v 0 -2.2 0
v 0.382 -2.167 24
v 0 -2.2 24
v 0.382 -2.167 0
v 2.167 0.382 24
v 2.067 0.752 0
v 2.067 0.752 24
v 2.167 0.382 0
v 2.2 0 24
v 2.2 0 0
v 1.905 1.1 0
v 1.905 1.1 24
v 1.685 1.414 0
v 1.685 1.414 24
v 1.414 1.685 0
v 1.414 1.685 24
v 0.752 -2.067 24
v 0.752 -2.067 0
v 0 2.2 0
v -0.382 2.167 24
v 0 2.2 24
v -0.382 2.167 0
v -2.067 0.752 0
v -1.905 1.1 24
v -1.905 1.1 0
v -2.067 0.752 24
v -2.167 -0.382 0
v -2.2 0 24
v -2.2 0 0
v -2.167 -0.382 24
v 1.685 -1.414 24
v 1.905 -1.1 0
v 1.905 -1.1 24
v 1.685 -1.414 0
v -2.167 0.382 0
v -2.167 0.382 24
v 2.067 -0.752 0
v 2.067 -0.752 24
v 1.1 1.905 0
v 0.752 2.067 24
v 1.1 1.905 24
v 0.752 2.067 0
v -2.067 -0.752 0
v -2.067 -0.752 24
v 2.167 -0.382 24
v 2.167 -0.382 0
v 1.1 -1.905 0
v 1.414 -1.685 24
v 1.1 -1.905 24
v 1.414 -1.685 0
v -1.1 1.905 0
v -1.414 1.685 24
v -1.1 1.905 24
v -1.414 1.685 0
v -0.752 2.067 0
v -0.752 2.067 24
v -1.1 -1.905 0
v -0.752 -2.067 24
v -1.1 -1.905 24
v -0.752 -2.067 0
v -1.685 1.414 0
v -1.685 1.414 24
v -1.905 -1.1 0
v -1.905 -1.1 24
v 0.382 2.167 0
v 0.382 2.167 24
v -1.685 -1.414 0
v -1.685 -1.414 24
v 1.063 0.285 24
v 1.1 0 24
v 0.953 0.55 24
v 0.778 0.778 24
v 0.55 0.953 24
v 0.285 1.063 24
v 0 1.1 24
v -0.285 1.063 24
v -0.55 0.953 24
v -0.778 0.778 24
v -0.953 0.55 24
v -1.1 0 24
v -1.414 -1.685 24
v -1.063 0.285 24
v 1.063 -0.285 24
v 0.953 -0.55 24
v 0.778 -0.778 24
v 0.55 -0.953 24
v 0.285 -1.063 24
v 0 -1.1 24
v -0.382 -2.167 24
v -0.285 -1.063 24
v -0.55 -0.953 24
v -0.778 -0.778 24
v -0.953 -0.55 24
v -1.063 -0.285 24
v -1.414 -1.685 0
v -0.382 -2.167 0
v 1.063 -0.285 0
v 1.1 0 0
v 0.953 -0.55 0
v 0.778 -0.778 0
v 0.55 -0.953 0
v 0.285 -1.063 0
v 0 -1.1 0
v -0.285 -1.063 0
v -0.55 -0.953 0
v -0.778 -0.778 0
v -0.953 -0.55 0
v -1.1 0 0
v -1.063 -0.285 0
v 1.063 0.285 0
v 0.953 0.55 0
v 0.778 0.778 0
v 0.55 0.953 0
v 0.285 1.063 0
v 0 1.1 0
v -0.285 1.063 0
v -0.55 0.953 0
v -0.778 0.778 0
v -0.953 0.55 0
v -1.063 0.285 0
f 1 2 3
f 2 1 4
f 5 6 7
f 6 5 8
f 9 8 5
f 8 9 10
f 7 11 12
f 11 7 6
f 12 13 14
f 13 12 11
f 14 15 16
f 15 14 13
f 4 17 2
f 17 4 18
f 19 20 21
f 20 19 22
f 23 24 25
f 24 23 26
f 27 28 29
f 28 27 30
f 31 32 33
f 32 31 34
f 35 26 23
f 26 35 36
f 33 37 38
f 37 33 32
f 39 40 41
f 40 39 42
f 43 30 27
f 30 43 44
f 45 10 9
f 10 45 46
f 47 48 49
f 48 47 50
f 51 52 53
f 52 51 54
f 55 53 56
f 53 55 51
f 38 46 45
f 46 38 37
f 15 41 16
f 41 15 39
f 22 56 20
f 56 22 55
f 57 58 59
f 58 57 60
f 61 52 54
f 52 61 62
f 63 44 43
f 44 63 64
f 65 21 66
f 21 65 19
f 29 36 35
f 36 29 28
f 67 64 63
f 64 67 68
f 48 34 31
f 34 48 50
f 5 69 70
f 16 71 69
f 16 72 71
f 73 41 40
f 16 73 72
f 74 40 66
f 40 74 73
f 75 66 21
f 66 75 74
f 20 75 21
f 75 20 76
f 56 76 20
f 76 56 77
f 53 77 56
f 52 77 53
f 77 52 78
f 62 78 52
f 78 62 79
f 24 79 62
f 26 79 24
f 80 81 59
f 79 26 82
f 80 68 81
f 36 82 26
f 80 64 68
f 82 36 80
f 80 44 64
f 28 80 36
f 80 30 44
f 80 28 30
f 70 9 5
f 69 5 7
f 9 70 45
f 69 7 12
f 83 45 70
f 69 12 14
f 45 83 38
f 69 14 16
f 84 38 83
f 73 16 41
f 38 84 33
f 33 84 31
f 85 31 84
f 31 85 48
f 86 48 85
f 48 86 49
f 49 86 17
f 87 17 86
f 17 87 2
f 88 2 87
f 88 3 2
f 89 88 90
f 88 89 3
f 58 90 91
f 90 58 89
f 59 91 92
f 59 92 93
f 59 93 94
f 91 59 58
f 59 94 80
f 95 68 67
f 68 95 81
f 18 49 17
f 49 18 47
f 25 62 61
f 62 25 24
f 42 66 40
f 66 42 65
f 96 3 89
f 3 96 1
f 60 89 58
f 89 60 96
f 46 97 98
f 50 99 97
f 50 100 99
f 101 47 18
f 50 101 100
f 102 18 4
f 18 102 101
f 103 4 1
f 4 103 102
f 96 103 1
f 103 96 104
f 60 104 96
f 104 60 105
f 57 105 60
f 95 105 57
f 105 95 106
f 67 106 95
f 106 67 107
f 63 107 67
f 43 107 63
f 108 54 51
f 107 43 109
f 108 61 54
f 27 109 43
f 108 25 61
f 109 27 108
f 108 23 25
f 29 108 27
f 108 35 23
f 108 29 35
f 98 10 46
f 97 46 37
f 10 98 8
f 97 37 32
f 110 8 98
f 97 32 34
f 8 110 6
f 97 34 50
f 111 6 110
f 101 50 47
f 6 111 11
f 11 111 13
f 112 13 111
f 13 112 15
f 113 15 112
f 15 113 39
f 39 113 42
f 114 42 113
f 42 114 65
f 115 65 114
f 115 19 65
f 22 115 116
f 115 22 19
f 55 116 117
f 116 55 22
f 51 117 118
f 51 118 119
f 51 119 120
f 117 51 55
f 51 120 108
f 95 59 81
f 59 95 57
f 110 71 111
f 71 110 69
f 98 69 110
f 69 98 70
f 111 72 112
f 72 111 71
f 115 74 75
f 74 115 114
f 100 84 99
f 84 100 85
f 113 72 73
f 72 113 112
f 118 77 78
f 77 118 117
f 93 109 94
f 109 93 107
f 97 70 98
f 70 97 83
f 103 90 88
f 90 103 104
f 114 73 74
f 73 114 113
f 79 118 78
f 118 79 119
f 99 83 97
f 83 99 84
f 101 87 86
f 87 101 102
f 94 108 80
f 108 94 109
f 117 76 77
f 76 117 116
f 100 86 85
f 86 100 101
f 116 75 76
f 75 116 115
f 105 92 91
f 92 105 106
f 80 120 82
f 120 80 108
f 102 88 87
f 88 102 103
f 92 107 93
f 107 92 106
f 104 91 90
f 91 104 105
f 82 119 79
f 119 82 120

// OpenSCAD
// file: PELA-print-parameters.scad
/*
Parametric PELA Print Tuning Parameters

Published at http://PELAblocks.org

By Paul Houghton
Twitter: @mobile_rat
Email: paulirotta@gmail.com
Blog: https://medium.com/@paulhoughton

Creative Commons Attribution-ShareAlike 4.0 International License
    https://creativecommons.org/licenses/by-sa/4.0/legalcode

Design work kindly sponsored by
    http://futurice.com

Imported automatically into other design files when you include PELA_parameters:
    include <PELA_parameters.scad>
 

INSTRUCTIONS
============
1. Test print PELA_calibration.scad

2. Choose a fit with real PELA

3. Enter those  numbers here. Most commonly you only adjust the top_tweak, bottom_tweak
   and side_connector_tweak numbers to match for your current use case and
   material/printer/slicer settings. Add comment to this file to help remember what you
   have calibrated now and in the past.

4. Print a couple of 4x4 blocks with these adjusted parameters

5. Confirm your calibration fit with real PELA and between two printed blocks.

6. All other models in this set will automatically now be adjusted to use your calibration numbers.


SUGGESTIONS
===========
- Don't waste time- use high precision, injection-moulded PELA parts when they are suitable and available.

- Layer height is not paricularly important, you can use your "standard" setting.

- If needed for a good snap fit, slow down or make similar adjustments to show fine details
  and strong inter-layer adhesion (especially with flexible materials).

- Some printing materials are slippery, not very flexible, or subject to small chips breaking off. This
  can affect the fit and part lifeime. In such cases, look at other parameters such as knob_height and
  geometric flexture adjustments to avoid making your calibration is more tight than needed for your
  application.

- Smaller nozzles give better results. The models are adjusted to work on FFF nozzles up to about 0.6mm
  diameter.
  
- Be patient. You can achieve a great fit and make many things with blocks. 
*/


/* [3D Printing Filament Adjustments] */

// Switch between flexible and rigid material geometry
flexible_material = false;

// Adjust gemoetry to aid the slicer when the minimum trace width is a problem (nozzle is > 0.5mm). This adjustments prevents geometry too thin to reproduce reliably in high speed or flexible material processing. Some features such as the ability to insert knobs into 1/2 unit sockets will be lost to accomodate thicker parts.
large_nozzle = true;

// Thickness of the solid outside surface of the block
shell = large_nozzle ? 1.2 : 1.0;

// Thickness of the solid top surface of the block
top_shell = 1.5;


/* [3D Printing Top Connector Adjustments] */

// Top knob size adjustment (larger is a stiffer fit, add in multiples of 0.01mm as determined from your calibration-block print)
top_tweak = 0.01; // 0.04 for rPET, 0 for PLA, 0.01 for NGEN, 0.02 for NGEN Flex, 0.09 for Ninjaflex

// Size of the top connectors (note that some plastics are more slippery or brittle than ABS and this may negatively affect results or part lifetime, the value below is tuned for Taz 6 with 0.5 nozzle, Lulzbot Cura default and NGEN)
knob_radius = 2.45 + 0.12 + top_tweak;

// Distance below knob top surface and the internal flexture
knob_top_thickness = 0.8;

// Height of the connectors (1.8 is original LEGO standard, 2 gives a stronger hold while still maintaining compatibility, flexible materials benefit from being taller)
knob_height = flexible_material ? 9.6/3 : 2.0;

// Size of the small flexture cavity inside each knob (default is 1.4, set to 0 for flexible materials)
knob_flexture_radius = flexible_material ? 0.0 : 1.4;

// Height of the easy connect slope near connector top (0 to disable such as for flexible materials, a bigger value such as 0.1 may help ease a tightly tuned fit or compensate for overextrusion)
knob_bevel = flexible_material ? 0.3 : 0.0;


/* [3D Printing Bottom Connector Adjustments] */

// Bottom connector size adjustment (smaller is tigher, add in multiples of 0.01mm as determined from your calibration-block print)
bottom_tweak = 0.05; // 0.10 for overextruded rPET, 0.05 for NGEN, 0 for NGEN Flex, -0.04 for Ninjaflex

// Bottom connector flexture ring wall thickness (note that some plastics are more slippery or brittle than ABS and this may negatively affect results or part lifetime, the value below is tuned for Taz 6 with 0.5 nozzle, Lulzbot Cura default and NGEN)
ring_thickness = large_nozzle ? 1.2 : 0.8;

// Bottom connector flexture ring size (note that some plastics are more slippery or brittle than ABS and this may negatively affect results or part lifetime, the value below is tuned for Taz 6 with 0.5 nozzle, Lulzbot Cura default and NGEN)
ring_radius = 2.75 + ring_thickness + bottom_tweak;

// Additional distance from outside lock and connector rings which small flexture-fit rims protrude inwards to grab the base of knobs for asymmetric side pressure to assist a snap fit
side_lock_thickness = 0.02;


/* [3D Printing Side Connector Adjustments] */

// Side connector size adjustment (larger is a looser fit, add in multiples of 0.01mm as determined from your calibration-block print)
axle_hole_tweak = 0; // 0.04 for rPET, 0 for NGEN, 0 for NGEN Flex, 0.04 for Ninjaflex

// Technic connector hole
axle_hole_radius = 2.45 + axle_hole_tweak;


/* [Print Supports] */

// Thickness of each rotating layer in a support
support_layer_height = 0.25;

// Horizontal width of each side of a support triangle
support_line_width = large_nozzle ? 0.7 : 0.4;

// Length of sides of a support triangle
support_side_length = 2;

// Degrees to rotate for strength at each successive layer
support_layer_rotation = 6; // Degrees

// Max rotation before reversing direction to keep shape basically triangular but still strong (0 to disable)
support_max_rotation = 0; // Degrees
// file: PELA-parameters.scad
/*
PELA Parametric Block Parameters

Published at http://PELAblocks.org

By Paul Houghton
Twitter: @mobile_rat
Email: paulirotta@gmail.com
Blog: https://medium.com/@paulhoughton

Creative Commons Attribution-ShareAlike 4.0 International License
    https://creativecommons.org/licenses/by-sa/4.0/legalcode

Design work kindly sponsored by
    http://futurice.com

Import this into other design files to set baseline constants:
    include <PELA_parameters.scad>
*/

include <PELA-print-parameters.scad>


/* [PELA Block Dimensions] */

// Length of the block (PELA unit count)
l = 4; 

// Width of the block (PELA unit count)
w = 4;

// Height of the block (PELA unit count)
h = 1;


/* [Basic Block Features] */

// Presence of bottom connector sockets
sockets= 1; // [0:no sockets, 1:sockets]

// Presence of top connector knobs
knobs=1; // [0:disabled, 1:enabled]

// Place holes in the corners for mountings screws (0=>no holes, 1=>holes)
bolt_holes=0; // [0:no holes, 1:holes]

// Size of corner holes for M3 mountings bolts
bolt_hole_radius=1.5;

// Interior fill for layers above the bottom
solid_upper_layers = 0; // [0:empty, 1:solid]

// Interior fill for layers above the bottom
solid_bottom_layer = 0; // [0:empty, 1:solid]


/* [Technic-compatible Block Features] */

// Add full width through holes spaced along the length for PELA Techics connectors
side_holes = 3;  // [0:disabled, 1:short air vents, 2:short connectors, 3:full width connectors]

// Add a sheath around Technic side holes (only used if there are side_holes, disable for extra ventilation, enable for connector lock notches)
side_sheaths = 1; // [0:disabled, 1:enabled]

// Add short end holes spaced along the width for PELA Techics connectors
end_holes = 2;  // [0:disabled, 1:short air vents, 2:short connectors, 3:full length connectors]

// Add a sheath around end holes  (only used if there are end_holes, disable for extra ventilation, enable for connector lock notches)
end_sheaths = 1; // [0:disabled, 1:enabled]

// Add holes in the top deck to improve airflow and reduce weight
top_vents = 0; // [0:disabled, 1:enabled]

// Size of a hole in the top of each knob. 0 to disable or use for air circulation/aesthetics/drain resin from the cutout, but larger holes change flexture such that knobs may not hold as well.
knob_vent_radius = 0;


/* [Aesthetic Options for Basic Blocks] */

// Width of a line etched in the side of multi-layer block sets (0 to disable)
ridge_width = 0.15;

// Depth of a line etched in the side of multi-layer block sets
ridge_depth = 0.3;


/* [Advanced Options for Basic Blocks] */

// Minimum angle to approximate a circle
$fa=10;

// Minimum segment length to approximate a circle
$fs=0.3;

// [0:hidden, 1:display where knobs of a block below would be ]
show_shadow_knobs = 0;

// Basic unit horizontal size of each block
block_width=8;

// Basic unit vertical size of each block
block_height=9.6;

// Horizontal clearance space around the outer surface of the set of blocks to allow two parts to be placed next to one another
skin = 0.1;

// Height of the hole beneath each knob which facilitates click lock in low-flex materials by variable side pressure on any block above
knob_flexture_height=4.5;

// Width of horizontal surface strengthening slats between the bottom rings
bottom_stiffener_width=2.6;

// Height of horizontal surface strengthening slats (appears between the bottom rings, default is print-parameters.scad:knob_height)
bottom_stiffener_height=knob_height;


/* [Advanced Options for Technic-compatible Blocks] */

// Technic connector inset radius
counterbore_inset_radius = 3.1;

// Technic connector inset depth
counterbore_inset_depth = 0.8;

// Contact length of axle to block (not including inset length and end snap fit flexture in pin connectors)
peg_length = 6.5;

// Size of an optional cylinder wrapped around the bearing holes
bearing_sheath_thickness = 0.9;

/* [Hidden] */

// Slight visual offset to work around prevent goldfeather rendering bugs in OpenSCAD (visual, not affecting final print geometry)
defeather = 0.01;

// Roundness of bottom connector rings (Use 8 for octagonal sockets- many parts of the geomoetry must be adjusted if you change this)
ring_fn=8;
// main file
/*
PELA Parametric Technic-compatible Axle

PELA Parametric Blocks - 3D Printed LEGO-compatible parametric blocks

Published at http://PELAblocks.org

By Paul Houghton
Twitter: @mobile_rat
Email: paulirotta@gmail.com
Blog: https://medium.com/@paulhoughton

Creative Commons Attribution-ShareAlike 4.0 International License
    https://creativecommons.org/licenses/by-sa/4.0/legalcode

Design work kindly sponsored by
    http://futurice.com
*/

include <PELA-parameters.scad>
include <PELA-print-parameters.scad>
use <PELA-block.scad>

/* [PELA Technic-compatible Pin Options] */

// Axle length
axle_length = block_width(3);

// An axle which fits loosely in a technic bearing hole
axle_radius = 2.2;

// Size of the hollow inside an axle
axle_center_radius=axle_radius/2;

///////////////

axle();

    
//////////////////


// A round rotation axle
module axle(axle_radius=axle_radius, axle_center_radius=axle_center_radius, axle_length=axle_length) {

    difference() {
        cylinder(r=axle_radius, h=axle_length);
        translate([0, 0, -defeather])
            cylinder(r=axle_center_radius, h=axle_length+2*defeather);
    }
}
